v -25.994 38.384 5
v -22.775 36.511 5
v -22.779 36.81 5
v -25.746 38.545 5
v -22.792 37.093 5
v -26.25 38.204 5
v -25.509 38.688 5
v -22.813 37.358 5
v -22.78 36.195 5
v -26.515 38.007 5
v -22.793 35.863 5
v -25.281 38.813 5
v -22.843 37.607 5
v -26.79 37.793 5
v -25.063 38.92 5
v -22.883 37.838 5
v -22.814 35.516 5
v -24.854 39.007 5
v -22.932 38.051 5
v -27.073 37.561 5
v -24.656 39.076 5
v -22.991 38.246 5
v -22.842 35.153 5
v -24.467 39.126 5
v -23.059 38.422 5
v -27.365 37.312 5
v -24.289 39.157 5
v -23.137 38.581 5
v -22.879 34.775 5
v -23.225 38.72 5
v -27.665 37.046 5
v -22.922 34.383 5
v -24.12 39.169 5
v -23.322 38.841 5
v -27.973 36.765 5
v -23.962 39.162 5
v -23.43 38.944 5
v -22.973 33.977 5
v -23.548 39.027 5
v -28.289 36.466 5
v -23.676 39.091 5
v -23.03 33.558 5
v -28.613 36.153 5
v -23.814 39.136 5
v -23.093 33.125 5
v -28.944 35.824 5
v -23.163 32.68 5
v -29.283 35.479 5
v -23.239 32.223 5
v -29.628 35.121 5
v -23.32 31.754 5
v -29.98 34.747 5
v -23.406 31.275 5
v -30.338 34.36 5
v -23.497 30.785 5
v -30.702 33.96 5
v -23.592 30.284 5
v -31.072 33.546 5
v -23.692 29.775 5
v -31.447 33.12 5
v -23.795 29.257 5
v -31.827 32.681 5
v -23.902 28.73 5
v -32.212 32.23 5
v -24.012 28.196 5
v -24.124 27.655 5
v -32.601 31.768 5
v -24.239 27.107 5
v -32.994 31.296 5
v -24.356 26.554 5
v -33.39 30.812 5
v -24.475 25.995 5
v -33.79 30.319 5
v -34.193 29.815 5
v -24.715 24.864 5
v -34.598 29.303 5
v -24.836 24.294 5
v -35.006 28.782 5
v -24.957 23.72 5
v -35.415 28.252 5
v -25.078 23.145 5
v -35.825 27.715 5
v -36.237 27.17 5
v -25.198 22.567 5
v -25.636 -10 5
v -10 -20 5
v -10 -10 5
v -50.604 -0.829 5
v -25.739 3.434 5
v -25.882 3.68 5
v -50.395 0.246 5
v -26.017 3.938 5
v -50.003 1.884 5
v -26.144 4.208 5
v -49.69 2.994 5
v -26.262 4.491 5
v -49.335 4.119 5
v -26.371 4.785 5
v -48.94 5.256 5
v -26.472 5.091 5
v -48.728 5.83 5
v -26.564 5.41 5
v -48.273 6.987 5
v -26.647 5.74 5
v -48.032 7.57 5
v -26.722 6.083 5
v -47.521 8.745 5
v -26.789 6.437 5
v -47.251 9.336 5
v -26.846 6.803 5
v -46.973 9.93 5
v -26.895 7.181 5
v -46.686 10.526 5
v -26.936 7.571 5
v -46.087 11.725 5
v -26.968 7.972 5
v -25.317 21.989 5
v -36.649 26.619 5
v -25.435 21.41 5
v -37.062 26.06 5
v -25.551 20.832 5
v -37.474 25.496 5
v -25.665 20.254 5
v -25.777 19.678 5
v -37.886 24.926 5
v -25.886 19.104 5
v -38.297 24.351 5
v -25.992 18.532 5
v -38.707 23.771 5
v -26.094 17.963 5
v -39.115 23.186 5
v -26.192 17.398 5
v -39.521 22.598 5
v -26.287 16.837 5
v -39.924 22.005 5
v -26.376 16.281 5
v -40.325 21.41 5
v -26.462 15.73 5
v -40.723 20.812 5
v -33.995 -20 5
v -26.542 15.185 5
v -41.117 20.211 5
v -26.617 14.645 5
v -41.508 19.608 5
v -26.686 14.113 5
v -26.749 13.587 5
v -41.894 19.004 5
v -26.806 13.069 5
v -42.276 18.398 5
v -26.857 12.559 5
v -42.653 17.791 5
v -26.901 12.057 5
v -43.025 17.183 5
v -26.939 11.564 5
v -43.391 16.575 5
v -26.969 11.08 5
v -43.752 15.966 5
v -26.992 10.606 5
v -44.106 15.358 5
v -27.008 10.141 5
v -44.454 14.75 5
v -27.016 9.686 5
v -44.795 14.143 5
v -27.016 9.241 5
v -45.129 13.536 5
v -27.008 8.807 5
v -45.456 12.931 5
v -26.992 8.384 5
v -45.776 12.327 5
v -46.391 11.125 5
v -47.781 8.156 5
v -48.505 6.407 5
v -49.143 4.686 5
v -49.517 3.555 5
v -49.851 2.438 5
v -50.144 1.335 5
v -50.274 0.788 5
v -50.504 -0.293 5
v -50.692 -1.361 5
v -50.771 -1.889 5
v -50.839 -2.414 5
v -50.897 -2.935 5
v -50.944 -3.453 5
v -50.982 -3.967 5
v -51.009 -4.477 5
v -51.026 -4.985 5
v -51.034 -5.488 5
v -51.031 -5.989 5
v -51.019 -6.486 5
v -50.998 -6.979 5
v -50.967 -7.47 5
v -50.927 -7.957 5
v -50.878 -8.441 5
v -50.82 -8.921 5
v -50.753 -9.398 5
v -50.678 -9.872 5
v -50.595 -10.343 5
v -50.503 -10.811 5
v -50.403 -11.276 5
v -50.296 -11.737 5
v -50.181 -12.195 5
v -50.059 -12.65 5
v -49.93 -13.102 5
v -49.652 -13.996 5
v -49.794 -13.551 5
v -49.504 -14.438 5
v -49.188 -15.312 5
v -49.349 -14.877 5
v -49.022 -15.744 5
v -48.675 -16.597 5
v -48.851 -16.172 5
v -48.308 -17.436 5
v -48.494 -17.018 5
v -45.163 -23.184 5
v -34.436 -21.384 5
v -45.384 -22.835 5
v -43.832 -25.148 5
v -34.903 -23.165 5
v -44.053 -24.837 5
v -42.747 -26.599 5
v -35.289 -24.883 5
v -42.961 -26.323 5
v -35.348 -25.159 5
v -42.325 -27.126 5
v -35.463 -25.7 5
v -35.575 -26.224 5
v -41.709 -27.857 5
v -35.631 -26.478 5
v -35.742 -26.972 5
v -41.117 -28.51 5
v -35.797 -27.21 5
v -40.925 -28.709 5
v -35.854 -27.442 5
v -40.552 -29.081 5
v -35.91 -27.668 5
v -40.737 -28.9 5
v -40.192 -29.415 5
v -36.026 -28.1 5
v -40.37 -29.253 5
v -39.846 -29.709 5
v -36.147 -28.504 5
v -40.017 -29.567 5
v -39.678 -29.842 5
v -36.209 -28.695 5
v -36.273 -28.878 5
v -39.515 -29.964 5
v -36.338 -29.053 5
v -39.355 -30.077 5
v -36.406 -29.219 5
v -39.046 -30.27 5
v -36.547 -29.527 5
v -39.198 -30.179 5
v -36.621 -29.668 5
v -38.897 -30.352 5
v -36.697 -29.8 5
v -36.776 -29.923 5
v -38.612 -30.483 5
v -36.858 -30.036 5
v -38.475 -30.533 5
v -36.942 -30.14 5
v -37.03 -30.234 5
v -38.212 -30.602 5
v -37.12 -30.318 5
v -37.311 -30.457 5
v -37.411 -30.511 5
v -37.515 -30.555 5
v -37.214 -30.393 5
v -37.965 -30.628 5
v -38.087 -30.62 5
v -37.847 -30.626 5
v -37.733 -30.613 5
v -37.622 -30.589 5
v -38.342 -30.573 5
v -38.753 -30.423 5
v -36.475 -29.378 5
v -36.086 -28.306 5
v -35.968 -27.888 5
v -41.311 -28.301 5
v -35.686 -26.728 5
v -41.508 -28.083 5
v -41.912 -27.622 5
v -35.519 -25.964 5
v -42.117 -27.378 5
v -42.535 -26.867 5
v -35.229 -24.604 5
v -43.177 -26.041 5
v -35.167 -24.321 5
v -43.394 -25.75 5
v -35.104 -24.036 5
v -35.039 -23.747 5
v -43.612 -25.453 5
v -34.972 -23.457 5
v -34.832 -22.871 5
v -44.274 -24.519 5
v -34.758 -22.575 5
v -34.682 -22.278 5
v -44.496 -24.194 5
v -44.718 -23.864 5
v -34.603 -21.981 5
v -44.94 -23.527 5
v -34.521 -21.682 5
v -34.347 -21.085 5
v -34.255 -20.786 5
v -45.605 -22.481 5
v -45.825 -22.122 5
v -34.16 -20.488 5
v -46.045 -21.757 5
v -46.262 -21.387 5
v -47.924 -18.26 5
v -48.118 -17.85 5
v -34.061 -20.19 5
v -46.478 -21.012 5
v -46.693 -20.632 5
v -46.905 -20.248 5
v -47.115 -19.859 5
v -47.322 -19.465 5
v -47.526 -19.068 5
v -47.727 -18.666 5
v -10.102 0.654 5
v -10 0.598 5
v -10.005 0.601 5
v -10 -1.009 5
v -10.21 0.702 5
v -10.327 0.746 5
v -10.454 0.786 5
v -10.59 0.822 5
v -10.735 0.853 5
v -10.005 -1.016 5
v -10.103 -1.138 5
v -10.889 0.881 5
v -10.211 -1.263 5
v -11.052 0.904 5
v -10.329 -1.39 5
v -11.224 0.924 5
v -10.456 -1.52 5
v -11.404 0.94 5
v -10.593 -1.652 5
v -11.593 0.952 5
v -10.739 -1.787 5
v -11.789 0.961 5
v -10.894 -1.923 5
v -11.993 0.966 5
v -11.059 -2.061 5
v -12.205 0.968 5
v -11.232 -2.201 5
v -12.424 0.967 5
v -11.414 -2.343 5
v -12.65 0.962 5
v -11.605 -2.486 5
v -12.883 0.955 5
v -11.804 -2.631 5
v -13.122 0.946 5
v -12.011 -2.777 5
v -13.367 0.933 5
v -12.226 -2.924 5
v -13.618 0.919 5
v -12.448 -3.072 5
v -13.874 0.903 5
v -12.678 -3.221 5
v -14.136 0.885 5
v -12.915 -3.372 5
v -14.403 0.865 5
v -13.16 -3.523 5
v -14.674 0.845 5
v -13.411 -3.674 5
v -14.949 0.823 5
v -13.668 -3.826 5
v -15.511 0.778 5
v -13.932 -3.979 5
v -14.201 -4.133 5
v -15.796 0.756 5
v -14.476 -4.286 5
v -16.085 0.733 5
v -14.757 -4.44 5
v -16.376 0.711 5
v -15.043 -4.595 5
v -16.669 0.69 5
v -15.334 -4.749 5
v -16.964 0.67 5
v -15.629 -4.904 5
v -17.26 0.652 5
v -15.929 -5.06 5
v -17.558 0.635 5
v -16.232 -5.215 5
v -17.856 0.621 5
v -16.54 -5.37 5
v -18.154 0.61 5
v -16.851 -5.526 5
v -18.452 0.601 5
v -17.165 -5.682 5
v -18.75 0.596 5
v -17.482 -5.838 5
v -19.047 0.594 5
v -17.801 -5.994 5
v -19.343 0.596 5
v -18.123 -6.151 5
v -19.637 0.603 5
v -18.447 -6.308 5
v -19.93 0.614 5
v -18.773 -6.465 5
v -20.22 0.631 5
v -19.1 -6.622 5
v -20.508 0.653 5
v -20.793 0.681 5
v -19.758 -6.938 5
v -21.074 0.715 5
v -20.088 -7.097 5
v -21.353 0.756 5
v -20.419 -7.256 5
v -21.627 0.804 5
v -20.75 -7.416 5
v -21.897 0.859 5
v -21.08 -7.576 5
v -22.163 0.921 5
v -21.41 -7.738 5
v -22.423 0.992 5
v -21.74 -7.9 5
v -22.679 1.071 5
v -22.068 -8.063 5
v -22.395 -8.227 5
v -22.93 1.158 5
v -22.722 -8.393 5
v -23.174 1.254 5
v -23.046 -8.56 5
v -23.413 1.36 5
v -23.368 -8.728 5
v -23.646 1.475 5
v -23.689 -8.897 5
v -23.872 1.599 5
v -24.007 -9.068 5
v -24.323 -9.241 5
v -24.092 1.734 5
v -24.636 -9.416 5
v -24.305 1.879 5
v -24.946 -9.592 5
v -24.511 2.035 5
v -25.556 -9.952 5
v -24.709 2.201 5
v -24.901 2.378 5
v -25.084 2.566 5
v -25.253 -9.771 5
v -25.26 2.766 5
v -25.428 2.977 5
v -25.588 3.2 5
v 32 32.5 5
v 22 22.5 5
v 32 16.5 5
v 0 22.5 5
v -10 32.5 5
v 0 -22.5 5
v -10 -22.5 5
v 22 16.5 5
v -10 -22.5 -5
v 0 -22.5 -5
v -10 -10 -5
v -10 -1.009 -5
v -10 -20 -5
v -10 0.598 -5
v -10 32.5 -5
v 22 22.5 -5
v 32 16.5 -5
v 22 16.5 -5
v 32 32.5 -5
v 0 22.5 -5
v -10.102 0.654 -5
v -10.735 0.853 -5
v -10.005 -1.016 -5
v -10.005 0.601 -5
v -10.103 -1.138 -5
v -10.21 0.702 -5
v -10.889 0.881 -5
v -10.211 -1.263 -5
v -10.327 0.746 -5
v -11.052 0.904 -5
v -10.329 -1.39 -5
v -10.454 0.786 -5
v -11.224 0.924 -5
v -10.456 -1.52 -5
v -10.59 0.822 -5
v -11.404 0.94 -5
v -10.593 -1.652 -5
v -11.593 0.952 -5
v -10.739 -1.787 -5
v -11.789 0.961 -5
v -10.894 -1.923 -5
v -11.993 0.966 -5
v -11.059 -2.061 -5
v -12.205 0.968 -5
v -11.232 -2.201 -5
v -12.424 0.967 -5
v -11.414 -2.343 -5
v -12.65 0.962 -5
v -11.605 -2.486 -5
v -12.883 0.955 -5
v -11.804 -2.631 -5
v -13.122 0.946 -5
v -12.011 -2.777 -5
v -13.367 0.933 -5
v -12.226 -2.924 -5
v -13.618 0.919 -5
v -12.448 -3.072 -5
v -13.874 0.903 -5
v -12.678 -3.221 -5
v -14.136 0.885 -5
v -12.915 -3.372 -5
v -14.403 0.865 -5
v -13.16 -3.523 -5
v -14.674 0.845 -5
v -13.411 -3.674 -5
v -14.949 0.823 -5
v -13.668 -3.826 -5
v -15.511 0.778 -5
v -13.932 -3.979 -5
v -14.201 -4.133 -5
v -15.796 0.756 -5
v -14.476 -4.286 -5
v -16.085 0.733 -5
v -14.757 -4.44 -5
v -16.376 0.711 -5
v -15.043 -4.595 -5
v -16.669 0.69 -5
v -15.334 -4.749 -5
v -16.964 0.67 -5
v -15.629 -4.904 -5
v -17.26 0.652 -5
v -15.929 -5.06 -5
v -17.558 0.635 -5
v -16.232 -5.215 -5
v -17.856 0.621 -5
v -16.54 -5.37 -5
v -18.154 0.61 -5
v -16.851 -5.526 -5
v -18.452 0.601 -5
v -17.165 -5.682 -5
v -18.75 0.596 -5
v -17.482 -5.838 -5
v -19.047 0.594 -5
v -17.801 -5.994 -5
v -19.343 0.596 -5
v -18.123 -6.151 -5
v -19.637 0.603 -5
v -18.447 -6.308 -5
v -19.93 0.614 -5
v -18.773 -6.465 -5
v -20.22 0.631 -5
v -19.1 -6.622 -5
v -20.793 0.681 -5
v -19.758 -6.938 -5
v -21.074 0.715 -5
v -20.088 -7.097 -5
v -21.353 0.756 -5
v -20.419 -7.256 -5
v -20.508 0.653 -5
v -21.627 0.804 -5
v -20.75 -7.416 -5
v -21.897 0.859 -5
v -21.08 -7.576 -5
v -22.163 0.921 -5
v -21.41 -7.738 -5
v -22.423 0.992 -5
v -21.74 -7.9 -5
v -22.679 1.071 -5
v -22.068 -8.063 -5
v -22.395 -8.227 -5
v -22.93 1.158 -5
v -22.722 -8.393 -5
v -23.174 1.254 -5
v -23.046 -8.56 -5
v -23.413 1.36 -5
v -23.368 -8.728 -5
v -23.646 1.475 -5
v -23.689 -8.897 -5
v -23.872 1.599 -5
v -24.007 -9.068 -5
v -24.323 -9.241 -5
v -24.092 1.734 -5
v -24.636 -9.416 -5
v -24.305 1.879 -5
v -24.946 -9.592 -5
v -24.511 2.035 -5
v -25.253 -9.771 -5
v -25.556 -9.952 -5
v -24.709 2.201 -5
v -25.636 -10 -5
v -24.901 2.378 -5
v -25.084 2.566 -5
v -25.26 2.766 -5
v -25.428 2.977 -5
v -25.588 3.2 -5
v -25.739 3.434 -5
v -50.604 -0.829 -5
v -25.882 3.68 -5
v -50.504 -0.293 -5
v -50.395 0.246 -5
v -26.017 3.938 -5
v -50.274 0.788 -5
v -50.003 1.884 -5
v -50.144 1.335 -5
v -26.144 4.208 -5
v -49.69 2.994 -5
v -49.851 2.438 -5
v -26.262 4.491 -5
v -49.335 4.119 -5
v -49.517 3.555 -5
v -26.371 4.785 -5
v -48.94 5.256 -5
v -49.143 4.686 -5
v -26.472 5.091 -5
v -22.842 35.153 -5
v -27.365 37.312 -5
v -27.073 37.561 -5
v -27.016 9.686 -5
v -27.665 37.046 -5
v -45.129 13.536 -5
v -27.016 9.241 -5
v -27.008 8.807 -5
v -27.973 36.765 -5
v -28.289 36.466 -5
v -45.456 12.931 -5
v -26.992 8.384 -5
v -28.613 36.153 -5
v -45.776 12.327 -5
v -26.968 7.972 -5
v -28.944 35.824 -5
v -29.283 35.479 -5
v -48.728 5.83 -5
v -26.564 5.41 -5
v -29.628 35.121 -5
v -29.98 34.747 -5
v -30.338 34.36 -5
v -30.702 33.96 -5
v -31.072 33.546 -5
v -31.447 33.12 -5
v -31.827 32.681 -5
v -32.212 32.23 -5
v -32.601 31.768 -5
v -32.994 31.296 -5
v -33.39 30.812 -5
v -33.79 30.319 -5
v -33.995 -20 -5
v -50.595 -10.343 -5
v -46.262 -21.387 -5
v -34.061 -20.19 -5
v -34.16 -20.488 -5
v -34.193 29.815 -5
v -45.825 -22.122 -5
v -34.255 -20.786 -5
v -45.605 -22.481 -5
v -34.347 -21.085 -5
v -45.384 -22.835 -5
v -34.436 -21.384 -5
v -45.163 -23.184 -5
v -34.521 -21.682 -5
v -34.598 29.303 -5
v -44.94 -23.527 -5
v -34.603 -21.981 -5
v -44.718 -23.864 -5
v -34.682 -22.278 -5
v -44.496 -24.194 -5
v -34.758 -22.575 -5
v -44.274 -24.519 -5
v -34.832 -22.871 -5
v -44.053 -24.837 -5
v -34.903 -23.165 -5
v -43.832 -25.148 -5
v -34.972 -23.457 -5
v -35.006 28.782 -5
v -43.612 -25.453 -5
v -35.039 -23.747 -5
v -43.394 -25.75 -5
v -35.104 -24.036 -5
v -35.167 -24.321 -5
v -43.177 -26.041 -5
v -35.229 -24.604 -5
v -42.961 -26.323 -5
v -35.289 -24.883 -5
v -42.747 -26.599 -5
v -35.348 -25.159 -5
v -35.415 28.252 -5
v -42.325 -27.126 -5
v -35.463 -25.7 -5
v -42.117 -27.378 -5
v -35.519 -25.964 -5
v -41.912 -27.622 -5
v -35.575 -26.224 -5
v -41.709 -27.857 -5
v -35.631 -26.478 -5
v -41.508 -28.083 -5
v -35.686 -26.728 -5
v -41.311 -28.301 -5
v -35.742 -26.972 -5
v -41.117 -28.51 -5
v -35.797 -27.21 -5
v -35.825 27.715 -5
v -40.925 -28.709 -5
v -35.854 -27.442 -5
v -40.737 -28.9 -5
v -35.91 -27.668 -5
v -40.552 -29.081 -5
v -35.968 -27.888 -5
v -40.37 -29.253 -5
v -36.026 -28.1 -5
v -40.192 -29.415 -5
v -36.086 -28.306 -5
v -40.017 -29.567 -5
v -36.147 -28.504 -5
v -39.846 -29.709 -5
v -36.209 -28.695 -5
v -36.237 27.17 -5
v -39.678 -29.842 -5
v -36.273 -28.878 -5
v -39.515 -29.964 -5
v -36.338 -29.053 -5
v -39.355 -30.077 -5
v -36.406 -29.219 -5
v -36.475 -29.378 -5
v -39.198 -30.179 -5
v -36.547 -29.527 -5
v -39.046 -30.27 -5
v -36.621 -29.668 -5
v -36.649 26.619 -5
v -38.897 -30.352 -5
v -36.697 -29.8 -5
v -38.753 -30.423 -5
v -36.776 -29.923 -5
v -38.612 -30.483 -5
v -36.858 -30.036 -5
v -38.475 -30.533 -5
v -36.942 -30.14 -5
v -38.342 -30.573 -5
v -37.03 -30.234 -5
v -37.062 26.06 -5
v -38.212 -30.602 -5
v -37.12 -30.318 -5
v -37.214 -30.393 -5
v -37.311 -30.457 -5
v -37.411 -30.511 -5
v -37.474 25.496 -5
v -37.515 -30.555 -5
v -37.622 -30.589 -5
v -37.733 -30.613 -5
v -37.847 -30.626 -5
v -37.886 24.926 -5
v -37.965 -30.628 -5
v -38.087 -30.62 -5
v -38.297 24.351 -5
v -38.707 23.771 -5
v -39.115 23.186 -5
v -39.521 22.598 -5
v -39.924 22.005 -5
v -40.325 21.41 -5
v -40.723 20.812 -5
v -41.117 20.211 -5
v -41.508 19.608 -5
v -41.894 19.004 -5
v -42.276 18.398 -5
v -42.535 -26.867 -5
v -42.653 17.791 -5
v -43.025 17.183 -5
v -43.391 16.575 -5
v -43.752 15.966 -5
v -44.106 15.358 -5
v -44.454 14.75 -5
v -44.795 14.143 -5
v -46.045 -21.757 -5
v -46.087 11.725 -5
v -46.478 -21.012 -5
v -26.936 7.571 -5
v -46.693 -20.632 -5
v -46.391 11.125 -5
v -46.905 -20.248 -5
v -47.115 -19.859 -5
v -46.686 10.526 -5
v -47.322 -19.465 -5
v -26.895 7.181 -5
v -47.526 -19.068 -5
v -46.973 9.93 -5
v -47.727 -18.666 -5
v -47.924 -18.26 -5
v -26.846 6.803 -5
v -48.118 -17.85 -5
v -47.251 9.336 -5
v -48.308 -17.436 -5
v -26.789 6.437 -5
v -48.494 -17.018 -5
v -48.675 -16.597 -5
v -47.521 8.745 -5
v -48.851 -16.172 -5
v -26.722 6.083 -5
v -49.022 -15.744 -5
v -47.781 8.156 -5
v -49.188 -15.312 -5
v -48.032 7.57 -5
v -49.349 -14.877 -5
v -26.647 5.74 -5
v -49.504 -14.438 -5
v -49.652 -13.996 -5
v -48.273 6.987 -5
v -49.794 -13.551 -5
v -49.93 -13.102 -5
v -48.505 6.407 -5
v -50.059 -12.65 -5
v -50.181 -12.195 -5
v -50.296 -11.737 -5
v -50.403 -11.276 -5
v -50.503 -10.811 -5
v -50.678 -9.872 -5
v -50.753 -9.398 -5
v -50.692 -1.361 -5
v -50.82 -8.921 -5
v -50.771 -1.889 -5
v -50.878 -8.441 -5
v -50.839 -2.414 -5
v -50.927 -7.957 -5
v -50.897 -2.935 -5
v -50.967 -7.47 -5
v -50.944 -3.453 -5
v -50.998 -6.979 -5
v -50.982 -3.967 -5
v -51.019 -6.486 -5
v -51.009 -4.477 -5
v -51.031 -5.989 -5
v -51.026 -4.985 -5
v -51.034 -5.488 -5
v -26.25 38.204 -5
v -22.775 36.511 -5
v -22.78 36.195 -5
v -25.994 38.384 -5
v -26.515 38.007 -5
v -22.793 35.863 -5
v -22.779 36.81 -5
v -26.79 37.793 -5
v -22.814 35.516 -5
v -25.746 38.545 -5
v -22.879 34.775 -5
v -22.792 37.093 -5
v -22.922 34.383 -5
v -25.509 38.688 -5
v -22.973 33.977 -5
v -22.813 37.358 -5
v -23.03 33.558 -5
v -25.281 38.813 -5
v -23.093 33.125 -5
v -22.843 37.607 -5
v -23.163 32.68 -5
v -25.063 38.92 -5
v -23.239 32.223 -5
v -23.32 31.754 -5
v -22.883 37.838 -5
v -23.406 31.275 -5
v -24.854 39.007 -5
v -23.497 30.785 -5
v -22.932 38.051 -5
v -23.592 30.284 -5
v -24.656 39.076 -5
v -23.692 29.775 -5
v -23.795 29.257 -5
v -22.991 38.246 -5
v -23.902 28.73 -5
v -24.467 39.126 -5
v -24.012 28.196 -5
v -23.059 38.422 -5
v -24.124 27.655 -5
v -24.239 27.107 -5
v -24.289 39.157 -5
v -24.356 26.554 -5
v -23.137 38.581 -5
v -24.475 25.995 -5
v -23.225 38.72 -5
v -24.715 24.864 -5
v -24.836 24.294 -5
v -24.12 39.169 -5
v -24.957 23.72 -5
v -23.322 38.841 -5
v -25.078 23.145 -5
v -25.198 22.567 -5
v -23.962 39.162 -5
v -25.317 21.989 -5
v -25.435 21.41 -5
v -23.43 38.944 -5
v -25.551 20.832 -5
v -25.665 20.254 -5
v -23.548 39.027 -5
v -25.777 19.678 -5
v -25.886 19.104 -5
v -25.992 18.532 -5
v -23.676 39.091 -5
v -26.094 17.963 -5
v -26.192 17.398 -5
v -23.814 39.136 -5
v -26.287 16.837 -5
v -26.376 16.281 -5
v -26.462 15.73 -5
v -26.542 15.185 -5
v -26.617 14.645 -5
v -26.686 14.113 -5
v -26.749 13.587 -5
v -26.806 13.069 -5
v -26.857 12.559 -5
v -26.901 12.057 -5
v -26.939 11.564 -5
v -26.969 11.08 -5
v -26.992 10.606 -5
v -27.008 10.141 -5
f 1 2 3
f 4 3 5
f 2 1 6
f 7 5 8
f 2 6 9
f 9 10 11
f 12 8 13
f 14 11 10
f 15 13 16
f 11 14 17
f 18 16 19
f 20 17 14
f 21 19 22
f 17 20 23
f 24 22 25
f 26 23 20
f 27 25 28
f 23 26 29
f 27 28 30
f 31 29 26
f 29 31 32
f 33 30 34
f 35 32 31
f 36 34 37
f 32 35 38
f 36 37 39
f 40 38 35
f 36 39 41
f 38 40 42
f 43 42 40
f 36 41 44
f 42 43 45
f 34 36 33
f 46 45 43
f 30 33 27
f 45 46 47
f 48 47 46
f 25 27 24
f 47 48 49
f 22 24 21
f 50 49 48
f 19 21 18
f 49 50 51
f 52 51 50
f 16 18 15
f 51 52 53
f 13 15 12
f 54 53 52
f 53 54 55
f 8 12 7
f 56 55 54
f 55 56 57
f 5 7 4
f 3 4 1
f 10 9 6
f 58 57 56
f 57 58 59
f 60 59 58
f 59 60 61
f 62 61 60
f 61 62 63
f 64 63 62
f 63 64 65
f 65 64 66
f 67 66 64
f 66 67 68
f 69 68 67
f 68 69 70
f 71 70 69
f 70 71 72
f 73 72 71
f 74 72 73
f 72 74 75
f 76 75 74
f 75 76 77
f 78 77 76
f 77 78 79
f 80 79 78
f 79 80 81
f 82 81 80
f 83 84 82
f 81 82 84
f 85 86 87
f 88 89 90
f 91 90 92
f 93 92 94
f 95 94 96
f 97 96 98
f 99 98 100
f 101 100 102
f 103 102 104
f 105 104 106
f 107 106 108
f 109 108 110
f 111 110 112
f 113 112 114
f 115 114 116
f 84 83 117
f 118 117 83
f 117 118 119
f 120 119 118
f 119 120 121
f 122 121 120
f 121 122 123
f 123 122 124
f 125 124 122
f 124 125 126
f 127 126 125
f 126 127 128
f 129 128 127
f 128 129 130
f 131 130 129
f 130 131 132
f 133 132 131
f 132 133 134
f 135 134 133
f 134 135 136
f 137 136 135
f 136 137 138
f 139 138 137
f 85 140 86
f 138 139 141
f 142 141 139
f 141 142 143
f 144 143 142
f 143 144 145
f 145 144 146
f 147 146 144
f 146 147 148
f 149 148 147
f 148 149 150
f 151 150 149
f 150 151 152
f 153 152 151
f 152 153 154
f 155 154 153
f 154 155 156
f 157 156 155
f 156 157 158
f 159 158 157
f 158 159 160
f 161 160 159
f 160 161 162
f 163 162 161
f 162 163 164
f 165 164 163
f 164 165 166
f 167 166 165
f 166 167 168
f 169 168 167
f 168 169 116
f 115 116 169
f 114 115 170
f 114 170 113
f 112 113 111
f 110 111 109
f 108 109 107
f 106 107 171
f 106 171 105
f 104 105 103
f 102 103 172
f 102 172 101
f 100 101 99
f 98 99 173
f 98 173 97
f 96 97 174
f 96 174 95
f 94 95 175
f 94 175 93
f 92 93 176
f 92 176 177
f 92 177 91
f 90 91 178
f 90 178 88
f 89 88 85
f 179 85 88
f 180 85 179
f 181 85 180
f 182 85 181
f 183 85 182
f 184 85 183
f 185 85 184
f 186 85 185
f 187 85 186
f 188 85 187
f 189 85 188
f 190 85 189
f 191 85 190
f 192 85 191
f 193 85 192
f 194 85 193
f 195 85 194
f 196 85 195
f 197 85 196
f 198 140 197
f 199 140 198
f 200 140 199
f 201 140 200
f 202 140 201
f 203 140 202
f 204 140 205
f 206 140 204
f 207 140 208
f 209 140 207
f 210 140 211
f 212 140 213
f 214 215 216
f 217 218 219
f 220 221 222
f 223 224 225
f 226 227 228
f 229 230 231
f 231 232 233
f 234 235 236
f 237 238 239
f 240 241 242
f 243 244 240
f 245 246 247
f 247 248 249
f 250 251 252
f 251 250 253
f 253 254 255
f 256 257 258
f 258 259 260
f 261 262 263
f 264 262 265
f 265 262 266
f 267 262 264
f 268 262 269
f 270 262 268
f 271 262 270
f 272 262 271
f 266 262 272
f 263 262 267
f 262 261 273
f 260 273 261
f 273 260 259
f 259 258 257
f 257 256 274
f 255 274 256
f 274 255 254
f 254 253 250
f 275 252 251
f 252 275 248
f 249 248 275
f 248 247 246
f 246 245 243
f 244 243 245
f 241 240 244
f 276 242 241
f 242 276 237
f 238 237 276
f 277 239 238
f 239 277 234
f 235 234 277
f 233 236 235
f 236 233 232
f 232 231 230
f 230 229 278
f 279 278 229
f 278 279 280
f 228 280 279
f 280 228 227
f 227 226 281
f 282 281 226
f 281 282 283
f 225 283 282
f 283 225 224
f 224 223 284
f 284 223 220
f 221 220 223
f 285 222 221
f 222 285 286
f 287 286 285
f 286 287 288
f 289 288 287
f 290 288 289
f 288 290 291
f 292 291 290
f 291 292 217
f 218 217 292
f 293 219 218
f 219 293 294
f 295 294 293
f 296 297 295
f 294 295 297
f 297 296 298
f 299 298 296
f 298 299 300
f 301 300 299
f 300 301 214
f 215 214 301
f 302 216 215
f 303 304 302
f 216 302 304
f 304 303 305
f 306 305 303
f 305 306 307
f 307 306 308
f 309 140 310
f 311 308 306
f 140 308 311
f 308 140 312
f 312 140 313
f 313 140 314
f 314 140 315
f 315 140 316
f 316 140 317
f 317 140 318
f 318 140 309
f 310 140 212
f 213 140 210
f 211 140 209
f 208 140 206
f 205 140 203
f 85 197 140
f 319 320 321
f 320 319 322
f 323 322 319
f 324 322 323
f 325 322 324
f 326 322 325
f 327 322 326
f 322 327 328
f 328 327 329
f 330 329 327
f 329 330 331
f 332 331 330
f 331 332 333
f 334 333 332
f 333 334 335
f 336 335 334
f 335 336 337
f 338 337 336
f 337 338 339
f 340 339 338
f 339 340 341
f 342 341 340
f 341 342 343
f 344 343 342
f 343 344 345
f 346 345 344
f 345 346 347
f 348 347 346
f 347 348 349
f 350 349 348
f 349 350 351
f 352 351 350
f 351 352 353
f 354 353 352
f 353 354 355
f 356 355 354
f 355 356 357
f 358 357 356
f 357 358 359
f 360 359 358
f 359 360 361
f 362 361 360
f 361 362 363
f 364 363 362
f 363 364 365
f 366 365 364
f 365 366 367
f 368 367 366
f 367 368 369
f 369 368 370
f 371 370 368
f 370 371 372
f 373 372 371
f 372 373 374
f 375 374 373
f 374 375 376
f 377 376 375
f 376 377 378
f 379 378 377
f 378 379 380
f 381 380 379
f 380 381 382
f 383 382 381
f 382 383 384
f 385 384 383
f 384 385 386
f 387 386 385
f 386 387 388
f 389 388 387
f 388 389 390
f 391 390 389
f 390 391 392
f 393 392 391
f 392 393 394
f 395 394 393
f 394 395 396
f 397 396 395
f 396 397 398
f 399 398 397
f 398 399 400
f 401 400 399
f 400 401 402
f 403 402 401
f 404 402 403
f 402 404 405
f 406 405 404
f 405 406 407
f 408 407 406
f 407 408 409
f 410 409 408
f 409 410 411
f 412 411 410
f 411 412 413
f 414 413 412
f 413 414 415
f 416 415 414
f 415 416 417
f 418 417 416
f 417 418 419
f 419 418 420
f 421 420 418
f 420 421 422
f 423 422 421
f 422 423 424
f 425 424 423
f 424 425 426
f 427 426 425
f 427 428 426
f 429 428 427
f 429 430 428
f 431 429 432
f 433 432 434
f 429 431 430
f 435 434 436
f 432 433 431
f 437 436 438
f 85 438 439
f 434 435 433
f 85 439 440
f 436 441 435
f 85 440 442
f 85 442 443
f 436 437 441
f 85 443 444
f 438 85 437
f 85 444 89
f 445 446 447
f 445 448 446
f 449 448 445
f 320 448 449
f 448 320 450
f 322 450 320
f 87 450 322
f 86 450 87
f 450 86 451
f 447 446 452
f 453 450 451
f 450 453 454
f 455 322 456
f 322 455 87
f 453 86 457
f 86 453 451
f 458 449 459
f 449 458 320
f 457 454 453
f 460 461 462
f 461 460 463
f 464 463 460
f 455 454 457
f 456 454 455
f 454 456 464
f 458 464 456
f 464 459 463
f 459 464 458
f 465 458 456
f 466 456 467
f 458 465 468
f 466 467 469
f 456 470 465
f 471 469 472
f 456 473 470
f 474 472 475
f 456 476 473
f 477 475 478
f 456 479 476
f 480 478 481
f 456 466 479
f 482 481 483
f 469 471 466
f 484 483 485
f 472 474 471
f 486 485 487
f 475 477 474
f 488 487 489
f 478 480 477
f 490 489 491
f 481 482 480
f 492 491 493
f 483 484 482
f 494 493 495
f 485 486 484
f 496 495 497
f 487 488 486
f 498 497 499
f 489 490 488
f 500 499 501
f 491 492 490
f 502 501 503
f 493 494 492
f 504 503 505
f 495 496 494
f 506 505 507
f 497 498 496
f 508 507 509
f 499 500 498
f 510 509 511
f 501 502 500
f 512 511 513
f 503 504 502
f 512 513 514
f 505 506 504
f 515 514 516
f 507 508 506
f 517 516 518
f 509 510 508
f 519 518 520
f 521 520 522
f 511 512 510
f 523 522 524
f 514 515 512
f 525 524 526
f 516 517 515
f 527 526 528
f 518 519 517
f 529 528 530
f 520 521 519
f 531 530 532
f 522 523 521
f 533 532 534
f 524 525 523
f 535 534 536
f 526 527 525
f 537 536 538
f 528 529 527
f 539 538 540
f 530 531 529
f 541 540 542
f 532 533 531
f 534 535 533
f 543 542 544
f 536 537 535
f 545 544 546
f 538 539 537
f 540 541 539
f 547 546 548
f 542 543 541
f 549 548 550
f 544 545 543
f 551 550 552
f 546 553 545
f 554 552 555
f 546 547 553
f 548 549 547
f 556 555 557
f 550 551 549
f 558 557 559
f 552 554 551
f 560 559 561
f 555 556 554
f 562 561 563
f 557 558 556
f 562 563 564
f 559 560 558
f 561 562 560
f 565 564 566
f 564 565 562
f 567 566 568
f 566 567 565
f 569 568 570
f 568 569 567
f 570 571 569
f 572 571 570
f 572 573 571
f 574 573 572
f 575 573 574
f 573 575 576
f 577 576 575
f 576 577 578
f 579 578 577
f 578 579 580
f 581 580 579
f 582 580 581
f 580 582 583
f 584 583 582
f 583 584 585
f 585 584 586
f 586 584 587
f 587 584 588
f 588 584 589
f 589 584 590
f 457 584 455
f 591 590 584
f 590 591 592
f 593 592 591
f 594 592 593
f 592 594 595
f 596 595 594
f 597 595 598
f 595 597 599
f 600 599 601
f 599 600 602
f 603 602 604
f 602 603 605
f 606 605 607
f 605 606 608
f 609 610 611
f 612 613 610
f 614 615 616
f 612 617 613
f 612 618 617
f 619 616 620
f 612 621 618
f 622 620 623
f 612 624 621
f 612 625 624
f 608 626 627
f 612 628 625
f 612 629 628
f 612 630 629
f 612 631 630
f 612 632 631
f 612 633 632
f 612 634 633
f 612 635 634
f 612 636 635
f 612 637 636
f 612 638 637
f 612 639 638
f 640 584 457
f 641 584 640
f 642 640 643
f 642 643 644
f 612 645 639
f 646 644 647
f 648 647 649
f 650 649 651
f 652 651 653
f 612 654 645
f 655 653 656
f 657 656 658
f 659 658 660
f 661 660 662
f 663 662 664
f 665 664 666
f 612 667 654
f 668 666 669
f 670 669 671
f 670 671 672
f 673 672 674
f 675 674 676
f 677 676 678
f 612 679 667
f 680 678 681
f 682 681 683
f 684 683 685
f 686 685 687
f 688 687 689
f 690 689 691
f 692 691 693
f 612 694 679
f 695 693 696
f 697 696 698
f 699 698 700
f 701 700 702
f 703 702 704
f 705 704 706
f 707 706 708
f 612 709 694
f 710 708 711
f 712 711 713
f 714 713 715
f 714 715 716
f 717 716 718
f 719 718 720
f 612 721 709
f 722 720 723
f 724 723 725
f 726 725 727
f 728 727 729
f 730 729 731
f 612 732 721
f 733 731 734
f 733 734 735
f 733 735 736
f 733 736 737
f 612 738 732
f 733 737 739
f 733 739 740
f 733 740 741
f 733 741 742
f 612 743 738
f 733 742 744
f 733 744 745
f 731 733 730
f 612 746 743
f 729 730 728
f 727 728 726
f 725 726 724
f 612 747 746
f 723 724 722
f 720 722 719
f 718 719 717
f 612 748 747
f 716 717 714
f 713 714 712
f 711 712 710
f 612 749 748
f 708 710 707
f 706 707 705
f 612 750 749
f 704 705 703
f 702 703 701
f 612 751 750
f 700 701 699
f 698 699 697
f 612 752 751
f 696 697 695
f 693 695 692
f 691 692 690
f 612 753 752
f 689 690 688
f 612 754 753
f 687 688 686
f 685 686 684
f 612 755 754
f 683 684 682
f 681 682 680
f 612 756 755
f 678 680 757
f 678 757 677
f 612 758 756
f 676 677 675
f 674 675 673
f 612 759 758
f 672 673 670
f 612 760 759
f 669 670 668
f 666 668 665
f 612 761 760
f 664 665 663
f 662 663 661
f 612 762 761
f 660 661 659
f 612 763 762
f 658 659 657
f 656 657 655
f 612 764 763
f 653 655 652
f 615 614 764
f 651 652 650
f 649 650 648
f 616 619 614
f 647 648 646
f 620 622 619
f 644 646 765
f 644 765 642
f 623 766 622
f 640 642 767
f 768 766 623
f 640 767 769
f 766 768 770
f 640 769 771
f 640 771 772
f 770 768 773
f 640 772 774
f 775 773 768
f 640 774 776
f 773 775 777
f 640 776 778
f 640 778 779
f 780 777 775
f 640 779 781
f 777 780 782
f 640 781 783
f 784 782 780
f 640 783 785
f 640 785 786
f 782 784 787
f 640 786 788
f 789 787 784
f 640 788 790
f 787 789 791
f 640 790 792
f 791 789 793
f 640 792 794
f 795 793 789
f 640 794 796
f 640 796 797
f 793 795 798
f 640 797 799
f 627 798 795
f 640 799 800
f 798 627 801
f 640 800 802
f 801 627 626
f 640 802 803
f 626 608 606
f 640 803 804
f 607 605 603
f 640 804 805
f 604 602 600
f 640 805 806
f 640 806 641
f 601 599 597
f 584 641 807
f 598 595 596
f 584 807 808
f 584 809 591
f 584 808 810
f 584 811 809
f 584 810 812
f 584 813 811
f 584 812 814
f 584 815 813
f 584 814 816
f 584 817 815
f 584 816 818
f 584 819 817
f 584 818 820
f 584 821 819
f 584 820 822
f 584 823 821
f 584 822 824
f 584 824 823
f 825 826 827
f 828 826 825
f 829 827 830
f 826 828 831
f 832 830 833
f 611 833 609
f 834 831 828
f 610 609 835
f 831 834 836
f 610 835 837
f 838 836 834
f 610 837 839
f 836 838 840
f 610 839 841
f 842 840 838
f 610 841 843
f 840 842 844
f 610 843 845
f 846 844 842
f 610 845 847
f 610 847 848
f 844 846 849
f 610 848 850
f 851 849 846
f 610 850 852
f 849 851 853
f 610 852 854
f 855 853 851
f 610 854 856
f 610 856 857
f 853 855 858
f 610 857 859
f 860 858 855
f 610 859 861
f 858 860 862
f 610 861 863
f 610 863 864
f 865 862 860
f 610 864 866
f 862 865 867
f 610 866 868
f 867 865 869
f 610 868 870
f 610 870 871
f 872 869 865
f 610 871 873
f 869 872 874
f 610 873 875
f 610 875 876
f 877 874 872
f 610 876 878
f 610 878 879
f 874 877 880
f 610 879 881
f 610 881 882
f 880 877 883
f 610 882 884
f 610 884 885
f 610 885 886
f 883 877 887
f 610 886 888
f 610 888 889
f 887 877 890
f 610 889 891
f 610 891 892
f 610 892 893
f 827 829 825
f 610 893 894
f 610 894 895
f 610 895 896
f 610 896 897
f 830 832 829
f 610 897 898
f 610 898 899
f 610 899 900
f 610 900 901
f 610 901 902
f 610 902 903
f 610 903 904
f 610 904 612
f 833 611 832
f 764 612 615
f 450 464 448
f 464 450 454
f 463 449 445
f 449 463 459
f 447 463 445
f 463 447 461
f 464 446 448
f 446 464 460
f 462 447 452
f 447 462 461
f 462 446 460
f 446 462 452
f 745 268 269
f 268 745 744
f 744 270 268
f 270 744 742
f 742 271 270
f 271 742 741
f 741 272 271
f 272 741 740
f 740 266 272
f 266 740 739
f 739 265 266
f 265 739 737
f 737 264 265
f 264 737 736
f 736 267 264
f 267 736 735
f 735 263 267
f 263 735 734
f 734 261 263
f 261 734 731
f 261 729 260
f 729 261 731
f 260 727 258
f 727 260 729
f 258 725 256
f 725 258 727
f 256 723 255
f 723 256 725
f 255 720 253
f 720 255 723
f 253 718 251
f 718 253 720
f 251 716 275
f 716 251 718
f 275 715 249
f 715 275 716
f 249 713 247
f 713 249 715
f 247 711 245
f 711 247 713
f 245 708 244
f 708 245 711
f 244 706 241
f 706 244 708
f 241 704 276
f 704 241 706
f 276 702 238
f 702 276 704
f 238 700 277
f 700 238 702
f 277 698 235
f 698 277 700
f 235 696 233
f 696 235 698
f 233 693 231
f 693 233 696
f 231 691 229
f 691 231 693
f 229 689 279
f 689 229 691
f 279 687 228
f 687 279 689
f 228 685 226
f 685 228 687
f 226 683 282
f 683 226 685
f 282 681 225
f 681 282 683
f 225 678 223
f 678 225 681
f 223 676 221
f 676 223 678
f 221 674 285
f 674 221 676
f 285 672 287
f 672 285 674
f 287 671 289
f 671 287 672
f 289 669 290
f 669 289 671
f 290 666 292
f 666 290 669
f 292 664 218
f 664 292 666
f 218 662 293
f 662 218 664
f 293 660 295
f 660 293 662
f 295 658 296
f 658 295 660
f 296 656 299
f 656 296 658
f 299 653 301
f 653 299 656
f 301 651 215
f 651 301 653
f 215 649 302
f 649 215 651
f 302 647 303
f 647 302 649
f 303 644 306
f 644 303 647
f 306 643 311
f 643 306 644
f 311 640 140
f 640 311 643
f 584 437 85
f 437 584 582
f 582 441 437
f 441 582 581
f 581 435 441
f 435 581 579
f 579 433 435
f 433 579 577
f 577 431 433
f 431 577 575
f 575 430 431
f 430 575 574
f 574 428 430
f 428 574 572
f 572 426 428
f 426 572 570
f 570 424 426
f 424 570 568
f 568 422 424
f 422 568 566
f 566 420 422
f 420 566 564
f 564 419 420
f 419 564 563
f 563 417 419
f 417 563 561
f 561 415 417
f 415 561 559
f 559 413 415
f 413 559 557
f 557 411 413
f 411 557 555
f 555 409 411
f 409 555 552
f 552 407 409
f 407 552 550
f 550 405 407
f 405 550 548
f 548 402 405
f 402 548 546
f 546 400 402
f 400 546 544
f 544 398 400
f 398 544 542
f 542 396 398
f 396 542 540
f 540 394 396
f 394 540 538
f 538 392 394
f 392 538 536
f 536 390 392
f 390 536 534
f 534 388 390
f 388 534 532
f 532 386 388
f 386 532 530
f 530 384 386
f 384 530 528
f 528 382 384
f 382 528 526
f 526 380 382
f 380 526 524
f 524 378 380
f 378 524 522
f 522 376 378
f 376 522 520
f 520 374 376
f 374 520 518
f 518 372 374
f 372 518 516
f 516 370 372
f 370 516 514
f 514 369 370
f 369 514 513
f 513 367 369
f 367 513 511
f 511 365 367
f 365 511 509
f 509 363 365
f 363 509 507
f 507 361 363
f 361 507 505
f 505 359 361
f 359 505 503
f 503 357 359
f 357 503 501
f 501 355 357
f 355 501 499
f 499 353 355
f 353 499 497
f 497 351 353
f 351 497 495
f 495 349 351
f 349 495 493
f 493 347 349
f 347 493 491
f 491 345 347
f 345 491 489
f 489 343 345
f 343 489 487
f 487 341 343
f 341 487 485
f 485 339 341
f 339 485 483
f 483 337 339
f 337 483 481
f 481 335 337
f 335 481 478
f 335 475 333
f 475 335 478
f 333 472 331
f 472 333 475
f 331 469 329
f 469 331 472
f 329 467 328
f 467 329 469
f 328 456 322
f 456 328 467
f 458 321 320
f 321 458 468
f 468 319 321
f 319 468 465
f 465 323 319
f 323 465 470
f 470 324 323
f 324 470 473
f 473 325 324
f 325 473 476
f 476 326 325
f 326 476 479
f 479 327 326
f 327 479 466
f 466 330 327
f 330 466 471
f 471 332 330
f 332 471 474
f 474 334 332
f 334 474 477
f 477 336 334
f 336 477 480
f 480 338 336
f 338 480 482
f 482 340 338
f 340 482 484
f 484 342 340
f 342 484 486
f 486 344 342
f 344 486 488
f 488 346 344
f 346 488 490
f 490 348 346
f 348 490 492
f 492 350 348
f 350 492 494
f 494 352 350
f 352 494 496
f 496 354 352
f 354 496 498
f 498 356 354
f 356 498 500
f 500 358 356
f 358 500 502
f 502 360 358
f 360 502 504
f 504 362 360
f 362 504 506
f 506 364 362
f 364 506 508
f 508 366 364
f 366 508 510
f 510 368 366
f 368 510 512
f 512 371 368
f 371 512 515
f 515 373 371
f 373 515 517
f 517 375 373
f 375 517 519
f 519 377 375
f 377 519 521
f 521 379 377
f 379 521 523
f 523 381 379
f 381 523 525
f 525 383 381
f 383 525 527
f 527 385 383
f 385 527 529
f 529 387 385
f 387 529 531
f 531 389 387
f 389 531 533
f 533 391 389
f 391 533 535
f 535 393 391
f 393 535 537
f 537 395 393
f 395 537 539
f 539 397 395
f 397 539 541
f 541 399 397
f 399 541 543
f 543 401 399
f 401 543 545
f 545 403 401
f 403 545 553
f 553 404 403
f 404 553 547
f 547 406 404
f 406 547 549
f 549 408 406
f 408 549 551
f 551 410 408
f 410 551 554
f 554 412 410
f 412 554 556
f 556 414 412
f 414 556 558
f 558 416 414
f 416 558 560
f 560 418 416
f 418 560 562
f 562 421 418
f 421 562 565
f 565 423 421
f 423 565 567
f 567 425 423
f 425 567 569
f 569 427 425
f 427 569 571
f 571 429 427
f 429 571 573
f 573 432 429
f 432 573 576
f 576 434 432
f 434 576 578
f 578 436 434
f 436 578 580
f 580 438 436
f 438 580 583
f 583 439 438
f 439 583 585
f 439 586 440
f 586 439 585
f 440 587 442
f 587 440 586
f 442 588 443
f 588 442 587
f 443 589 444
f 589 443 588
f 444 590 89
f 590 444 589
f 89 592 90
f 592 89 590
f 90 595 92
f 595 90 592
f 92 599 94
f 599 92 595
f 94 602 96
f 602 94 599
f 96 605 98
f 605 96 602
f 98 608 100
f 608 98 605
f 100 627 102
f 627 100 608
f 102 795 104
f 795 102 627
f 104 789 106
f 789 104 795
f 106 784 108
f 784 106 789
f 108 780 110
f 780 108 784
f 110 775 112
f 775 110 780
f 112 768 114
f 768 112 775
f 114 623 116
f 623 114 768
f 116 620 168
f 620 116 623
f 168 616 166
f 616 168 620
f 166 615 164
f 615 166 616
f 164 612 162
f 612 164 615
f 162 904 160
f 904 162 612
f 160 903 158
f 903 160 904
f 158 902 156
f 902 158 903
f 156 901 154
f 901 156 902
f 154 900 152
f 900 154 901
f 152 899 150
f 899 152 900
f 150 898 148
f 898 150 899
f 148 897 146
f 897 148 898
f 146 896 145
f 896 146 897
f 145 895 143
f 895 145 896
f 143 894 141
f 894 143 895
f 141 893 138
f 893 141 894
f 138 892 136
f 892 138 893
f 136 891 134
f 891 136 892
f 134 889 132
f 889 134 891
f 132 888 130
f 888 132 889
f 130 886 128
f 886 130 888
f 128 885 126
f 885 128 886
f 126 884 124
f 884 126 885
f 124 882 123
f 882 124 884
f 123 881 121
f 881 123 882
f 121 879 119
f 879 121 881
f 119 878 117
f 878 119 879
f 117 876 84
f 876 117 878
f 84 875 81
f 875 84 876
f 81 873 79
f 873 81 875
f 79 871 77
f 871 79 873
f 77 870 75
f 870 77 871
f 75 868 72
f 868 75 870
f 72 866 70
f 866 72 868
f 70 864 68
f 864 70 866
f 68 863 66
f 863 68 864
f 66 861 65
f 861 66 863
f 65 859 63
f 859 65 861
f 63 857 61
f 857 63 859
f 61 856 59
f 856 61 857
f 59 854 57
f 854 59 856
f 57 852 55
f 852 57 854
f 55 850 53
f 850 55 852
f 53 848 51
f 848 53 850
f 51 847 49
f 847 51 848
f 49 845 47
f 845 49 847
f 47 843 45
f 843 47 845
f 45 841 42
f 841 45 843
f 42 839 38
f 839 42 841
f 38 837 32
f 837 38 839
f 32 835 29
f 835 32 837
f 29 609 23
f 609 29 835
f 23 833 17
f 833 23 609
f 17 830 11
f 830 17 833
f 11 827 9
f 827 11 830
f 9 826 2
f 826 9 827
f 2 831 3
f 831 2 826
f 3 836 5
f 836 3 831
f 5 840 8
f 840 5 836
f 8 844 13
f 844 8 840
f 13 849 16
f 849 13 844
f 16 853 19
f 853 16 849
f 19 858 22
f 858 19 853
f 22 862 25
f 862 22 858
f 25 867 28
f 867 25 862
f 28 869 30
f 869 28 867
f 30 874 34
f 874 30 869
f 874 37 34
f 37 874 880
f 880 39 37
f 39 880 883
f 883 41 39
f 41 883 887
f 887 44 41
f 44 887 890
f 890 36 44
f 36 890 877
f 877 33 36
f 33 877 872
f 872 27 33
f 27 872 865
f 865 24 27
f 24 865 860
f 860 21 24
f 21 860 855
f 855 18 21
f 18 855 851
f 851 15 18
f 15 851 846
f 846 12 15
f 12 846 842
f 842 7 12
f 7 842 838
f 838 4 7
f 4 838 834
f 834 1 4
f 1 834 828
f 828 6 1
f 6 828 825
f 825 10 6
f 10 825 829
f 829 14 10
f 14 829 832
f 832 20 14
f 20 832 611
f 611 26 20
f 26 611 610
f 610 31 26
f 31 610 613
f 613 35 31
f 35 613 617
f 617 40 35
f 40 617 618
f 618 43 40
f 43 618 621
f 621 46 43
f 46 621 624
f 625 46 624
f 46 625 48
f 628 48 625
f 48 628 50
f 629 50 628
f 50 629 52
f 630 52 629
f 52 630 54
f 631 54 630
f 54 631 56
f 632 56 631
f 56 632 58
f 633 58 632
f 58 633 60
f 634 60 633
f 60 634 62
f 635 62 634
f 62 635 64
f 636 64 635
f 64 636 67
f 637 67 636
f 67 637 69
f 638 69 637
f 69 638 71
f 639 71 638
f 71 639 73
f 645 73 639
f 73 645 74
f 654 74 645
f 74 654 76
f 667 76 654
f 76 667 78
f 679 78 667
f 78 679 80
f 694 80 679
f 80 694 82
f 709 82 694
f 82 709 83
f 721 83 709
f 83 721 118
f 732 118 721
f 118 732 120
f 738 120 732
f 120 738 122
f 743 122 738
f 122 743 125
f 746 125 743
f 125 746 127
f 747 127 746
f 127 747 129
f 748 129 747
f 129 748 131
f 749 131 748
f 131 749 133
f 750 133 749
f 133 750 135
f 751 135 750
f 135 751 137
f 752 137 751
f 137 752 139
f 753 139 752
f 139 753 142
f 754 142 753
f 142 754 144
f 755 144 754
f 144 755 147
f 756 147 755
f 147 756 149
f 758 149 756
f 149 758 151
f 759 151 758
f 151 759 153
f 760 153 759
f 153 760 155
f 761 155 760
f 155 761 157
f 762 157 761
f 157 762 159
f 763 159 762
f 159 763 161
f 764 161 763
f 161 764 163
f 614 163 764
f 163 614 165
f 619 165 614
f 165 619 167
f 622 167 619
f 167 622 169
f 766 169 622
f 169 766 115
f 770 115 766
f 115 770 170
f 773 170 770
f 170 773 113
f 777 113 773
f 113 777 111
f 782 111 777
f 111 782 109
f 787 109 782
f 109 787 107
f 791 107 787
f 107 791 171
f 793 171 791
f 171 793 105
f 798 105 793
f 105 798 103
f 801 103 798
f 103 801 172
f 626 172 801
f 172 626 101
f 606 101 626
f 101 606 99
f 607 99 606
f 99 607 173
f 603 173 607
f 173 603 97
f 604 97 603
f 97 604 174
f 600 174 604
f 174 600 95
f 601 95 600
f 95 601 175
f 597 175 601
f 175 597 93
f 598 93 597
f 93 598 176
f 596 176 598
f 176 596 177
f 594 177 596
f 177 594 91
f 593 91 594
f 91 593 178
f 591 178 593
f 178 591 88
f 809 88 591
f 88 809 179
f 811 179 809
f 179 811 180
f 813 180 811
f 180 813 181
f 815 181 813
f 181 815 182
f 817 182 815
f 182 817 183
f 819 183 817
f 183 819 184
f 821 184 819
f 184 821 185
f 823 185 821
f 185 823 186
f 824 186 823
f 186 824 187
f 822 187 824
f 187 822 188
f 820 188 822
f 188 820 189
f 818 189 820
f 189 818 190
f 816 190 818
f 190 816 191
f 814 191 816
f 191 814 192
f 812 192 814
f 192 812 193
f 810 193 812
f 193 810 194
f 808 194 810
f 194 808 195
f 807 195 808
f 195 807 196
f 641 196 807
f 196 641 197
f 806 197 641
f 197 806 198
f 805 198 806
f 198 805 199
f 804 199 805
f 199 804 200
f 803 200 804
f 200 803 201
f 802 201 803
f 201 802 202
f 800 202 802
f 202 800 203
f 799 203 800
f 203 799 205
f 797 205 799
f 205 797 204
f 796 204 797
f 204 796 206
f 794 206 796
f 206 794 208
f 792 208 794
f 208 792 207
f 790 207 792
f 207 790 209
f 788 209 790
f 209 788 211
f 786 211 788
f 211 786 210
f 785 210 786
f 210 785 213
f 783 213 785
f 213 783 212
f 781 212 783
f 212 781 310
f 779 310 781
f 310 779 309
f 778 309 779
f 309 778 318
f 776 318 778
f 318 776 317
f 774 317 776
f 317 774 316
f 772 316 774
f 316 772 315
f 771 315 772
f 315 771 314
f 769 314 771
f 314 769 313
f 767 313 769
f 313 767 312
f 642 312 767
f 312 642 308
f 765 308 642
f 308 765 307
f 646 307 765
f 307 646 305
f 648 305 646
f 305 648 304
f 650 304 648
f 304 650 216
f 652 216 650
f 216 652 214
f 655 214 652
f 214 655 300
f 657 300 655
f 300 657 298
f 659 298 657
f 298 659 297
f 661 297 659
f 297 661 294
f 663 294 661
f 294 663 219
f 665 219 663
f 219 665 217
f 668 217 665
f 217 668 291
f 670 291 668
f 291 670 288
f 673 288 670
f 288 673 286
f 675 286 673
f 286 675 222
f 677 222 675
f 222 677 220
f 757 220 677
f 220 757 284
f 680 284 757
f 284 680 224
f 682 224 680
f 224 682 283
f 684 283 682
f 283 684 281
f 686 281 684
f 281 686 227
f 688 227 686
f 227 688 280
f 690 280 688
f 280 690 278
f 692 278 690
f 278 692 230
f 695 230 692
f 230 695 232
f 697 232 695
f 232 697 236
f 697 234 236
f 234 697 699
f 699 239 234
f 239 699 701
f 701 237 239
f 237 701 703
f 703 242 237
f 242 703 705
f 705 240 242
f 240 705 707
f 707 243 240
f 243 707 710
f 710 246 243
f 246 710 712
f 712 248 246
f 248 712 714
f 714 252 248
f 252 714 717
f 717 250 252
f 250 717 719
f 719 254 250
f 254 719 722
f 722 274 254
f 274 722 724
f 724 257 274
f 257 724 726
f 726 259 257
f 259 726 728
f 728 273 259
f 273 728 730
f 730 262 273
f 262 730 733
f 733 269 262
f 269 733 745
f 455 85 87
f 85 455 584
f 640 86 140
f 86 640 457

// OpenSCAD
phone_width = 20;
phone_height = 50;

monitor_width = 22;
monitor_height = 45;
monitor_hinge = 6;

h = 10;

module monitor_entry(h){
color([0,1,0])
translate([-h/2,h/2,0])
rotate([0,0,90])
cube([monitor_height + h,h,h],center = true);

color([1,0,0])
translate([monitor_width/2  + h/ 2,monitor_height/2 + h/2,0])
cube([monitor_width + h,h,h],center = true);

color([0,0,1])
translate([monitor_width + h/2,monitor_height/2 - monitor_hinge/2,0])
rotate([0,0,90])
cube([monitor_hinge,h,h],center = true);
}

monitor_entry(h);






n = 500;
step = 360/n;
points = [ for (t=[0:step:359.999]) [10*pow(sin(t),3), 13*cos(t) - 6.5*sin(2*t) - 2*sin(3*t) - sin(4*t)]];
color([0,1,1])
translate([-phone_width - h,0,0])
rotate([0,0,-12])
scale([2,2,1])
linear_extrude(height=h,center = true)
    polygon(points);

translate([-25,-15,0])
scale([3,1,1])
cube(10,center = true);
